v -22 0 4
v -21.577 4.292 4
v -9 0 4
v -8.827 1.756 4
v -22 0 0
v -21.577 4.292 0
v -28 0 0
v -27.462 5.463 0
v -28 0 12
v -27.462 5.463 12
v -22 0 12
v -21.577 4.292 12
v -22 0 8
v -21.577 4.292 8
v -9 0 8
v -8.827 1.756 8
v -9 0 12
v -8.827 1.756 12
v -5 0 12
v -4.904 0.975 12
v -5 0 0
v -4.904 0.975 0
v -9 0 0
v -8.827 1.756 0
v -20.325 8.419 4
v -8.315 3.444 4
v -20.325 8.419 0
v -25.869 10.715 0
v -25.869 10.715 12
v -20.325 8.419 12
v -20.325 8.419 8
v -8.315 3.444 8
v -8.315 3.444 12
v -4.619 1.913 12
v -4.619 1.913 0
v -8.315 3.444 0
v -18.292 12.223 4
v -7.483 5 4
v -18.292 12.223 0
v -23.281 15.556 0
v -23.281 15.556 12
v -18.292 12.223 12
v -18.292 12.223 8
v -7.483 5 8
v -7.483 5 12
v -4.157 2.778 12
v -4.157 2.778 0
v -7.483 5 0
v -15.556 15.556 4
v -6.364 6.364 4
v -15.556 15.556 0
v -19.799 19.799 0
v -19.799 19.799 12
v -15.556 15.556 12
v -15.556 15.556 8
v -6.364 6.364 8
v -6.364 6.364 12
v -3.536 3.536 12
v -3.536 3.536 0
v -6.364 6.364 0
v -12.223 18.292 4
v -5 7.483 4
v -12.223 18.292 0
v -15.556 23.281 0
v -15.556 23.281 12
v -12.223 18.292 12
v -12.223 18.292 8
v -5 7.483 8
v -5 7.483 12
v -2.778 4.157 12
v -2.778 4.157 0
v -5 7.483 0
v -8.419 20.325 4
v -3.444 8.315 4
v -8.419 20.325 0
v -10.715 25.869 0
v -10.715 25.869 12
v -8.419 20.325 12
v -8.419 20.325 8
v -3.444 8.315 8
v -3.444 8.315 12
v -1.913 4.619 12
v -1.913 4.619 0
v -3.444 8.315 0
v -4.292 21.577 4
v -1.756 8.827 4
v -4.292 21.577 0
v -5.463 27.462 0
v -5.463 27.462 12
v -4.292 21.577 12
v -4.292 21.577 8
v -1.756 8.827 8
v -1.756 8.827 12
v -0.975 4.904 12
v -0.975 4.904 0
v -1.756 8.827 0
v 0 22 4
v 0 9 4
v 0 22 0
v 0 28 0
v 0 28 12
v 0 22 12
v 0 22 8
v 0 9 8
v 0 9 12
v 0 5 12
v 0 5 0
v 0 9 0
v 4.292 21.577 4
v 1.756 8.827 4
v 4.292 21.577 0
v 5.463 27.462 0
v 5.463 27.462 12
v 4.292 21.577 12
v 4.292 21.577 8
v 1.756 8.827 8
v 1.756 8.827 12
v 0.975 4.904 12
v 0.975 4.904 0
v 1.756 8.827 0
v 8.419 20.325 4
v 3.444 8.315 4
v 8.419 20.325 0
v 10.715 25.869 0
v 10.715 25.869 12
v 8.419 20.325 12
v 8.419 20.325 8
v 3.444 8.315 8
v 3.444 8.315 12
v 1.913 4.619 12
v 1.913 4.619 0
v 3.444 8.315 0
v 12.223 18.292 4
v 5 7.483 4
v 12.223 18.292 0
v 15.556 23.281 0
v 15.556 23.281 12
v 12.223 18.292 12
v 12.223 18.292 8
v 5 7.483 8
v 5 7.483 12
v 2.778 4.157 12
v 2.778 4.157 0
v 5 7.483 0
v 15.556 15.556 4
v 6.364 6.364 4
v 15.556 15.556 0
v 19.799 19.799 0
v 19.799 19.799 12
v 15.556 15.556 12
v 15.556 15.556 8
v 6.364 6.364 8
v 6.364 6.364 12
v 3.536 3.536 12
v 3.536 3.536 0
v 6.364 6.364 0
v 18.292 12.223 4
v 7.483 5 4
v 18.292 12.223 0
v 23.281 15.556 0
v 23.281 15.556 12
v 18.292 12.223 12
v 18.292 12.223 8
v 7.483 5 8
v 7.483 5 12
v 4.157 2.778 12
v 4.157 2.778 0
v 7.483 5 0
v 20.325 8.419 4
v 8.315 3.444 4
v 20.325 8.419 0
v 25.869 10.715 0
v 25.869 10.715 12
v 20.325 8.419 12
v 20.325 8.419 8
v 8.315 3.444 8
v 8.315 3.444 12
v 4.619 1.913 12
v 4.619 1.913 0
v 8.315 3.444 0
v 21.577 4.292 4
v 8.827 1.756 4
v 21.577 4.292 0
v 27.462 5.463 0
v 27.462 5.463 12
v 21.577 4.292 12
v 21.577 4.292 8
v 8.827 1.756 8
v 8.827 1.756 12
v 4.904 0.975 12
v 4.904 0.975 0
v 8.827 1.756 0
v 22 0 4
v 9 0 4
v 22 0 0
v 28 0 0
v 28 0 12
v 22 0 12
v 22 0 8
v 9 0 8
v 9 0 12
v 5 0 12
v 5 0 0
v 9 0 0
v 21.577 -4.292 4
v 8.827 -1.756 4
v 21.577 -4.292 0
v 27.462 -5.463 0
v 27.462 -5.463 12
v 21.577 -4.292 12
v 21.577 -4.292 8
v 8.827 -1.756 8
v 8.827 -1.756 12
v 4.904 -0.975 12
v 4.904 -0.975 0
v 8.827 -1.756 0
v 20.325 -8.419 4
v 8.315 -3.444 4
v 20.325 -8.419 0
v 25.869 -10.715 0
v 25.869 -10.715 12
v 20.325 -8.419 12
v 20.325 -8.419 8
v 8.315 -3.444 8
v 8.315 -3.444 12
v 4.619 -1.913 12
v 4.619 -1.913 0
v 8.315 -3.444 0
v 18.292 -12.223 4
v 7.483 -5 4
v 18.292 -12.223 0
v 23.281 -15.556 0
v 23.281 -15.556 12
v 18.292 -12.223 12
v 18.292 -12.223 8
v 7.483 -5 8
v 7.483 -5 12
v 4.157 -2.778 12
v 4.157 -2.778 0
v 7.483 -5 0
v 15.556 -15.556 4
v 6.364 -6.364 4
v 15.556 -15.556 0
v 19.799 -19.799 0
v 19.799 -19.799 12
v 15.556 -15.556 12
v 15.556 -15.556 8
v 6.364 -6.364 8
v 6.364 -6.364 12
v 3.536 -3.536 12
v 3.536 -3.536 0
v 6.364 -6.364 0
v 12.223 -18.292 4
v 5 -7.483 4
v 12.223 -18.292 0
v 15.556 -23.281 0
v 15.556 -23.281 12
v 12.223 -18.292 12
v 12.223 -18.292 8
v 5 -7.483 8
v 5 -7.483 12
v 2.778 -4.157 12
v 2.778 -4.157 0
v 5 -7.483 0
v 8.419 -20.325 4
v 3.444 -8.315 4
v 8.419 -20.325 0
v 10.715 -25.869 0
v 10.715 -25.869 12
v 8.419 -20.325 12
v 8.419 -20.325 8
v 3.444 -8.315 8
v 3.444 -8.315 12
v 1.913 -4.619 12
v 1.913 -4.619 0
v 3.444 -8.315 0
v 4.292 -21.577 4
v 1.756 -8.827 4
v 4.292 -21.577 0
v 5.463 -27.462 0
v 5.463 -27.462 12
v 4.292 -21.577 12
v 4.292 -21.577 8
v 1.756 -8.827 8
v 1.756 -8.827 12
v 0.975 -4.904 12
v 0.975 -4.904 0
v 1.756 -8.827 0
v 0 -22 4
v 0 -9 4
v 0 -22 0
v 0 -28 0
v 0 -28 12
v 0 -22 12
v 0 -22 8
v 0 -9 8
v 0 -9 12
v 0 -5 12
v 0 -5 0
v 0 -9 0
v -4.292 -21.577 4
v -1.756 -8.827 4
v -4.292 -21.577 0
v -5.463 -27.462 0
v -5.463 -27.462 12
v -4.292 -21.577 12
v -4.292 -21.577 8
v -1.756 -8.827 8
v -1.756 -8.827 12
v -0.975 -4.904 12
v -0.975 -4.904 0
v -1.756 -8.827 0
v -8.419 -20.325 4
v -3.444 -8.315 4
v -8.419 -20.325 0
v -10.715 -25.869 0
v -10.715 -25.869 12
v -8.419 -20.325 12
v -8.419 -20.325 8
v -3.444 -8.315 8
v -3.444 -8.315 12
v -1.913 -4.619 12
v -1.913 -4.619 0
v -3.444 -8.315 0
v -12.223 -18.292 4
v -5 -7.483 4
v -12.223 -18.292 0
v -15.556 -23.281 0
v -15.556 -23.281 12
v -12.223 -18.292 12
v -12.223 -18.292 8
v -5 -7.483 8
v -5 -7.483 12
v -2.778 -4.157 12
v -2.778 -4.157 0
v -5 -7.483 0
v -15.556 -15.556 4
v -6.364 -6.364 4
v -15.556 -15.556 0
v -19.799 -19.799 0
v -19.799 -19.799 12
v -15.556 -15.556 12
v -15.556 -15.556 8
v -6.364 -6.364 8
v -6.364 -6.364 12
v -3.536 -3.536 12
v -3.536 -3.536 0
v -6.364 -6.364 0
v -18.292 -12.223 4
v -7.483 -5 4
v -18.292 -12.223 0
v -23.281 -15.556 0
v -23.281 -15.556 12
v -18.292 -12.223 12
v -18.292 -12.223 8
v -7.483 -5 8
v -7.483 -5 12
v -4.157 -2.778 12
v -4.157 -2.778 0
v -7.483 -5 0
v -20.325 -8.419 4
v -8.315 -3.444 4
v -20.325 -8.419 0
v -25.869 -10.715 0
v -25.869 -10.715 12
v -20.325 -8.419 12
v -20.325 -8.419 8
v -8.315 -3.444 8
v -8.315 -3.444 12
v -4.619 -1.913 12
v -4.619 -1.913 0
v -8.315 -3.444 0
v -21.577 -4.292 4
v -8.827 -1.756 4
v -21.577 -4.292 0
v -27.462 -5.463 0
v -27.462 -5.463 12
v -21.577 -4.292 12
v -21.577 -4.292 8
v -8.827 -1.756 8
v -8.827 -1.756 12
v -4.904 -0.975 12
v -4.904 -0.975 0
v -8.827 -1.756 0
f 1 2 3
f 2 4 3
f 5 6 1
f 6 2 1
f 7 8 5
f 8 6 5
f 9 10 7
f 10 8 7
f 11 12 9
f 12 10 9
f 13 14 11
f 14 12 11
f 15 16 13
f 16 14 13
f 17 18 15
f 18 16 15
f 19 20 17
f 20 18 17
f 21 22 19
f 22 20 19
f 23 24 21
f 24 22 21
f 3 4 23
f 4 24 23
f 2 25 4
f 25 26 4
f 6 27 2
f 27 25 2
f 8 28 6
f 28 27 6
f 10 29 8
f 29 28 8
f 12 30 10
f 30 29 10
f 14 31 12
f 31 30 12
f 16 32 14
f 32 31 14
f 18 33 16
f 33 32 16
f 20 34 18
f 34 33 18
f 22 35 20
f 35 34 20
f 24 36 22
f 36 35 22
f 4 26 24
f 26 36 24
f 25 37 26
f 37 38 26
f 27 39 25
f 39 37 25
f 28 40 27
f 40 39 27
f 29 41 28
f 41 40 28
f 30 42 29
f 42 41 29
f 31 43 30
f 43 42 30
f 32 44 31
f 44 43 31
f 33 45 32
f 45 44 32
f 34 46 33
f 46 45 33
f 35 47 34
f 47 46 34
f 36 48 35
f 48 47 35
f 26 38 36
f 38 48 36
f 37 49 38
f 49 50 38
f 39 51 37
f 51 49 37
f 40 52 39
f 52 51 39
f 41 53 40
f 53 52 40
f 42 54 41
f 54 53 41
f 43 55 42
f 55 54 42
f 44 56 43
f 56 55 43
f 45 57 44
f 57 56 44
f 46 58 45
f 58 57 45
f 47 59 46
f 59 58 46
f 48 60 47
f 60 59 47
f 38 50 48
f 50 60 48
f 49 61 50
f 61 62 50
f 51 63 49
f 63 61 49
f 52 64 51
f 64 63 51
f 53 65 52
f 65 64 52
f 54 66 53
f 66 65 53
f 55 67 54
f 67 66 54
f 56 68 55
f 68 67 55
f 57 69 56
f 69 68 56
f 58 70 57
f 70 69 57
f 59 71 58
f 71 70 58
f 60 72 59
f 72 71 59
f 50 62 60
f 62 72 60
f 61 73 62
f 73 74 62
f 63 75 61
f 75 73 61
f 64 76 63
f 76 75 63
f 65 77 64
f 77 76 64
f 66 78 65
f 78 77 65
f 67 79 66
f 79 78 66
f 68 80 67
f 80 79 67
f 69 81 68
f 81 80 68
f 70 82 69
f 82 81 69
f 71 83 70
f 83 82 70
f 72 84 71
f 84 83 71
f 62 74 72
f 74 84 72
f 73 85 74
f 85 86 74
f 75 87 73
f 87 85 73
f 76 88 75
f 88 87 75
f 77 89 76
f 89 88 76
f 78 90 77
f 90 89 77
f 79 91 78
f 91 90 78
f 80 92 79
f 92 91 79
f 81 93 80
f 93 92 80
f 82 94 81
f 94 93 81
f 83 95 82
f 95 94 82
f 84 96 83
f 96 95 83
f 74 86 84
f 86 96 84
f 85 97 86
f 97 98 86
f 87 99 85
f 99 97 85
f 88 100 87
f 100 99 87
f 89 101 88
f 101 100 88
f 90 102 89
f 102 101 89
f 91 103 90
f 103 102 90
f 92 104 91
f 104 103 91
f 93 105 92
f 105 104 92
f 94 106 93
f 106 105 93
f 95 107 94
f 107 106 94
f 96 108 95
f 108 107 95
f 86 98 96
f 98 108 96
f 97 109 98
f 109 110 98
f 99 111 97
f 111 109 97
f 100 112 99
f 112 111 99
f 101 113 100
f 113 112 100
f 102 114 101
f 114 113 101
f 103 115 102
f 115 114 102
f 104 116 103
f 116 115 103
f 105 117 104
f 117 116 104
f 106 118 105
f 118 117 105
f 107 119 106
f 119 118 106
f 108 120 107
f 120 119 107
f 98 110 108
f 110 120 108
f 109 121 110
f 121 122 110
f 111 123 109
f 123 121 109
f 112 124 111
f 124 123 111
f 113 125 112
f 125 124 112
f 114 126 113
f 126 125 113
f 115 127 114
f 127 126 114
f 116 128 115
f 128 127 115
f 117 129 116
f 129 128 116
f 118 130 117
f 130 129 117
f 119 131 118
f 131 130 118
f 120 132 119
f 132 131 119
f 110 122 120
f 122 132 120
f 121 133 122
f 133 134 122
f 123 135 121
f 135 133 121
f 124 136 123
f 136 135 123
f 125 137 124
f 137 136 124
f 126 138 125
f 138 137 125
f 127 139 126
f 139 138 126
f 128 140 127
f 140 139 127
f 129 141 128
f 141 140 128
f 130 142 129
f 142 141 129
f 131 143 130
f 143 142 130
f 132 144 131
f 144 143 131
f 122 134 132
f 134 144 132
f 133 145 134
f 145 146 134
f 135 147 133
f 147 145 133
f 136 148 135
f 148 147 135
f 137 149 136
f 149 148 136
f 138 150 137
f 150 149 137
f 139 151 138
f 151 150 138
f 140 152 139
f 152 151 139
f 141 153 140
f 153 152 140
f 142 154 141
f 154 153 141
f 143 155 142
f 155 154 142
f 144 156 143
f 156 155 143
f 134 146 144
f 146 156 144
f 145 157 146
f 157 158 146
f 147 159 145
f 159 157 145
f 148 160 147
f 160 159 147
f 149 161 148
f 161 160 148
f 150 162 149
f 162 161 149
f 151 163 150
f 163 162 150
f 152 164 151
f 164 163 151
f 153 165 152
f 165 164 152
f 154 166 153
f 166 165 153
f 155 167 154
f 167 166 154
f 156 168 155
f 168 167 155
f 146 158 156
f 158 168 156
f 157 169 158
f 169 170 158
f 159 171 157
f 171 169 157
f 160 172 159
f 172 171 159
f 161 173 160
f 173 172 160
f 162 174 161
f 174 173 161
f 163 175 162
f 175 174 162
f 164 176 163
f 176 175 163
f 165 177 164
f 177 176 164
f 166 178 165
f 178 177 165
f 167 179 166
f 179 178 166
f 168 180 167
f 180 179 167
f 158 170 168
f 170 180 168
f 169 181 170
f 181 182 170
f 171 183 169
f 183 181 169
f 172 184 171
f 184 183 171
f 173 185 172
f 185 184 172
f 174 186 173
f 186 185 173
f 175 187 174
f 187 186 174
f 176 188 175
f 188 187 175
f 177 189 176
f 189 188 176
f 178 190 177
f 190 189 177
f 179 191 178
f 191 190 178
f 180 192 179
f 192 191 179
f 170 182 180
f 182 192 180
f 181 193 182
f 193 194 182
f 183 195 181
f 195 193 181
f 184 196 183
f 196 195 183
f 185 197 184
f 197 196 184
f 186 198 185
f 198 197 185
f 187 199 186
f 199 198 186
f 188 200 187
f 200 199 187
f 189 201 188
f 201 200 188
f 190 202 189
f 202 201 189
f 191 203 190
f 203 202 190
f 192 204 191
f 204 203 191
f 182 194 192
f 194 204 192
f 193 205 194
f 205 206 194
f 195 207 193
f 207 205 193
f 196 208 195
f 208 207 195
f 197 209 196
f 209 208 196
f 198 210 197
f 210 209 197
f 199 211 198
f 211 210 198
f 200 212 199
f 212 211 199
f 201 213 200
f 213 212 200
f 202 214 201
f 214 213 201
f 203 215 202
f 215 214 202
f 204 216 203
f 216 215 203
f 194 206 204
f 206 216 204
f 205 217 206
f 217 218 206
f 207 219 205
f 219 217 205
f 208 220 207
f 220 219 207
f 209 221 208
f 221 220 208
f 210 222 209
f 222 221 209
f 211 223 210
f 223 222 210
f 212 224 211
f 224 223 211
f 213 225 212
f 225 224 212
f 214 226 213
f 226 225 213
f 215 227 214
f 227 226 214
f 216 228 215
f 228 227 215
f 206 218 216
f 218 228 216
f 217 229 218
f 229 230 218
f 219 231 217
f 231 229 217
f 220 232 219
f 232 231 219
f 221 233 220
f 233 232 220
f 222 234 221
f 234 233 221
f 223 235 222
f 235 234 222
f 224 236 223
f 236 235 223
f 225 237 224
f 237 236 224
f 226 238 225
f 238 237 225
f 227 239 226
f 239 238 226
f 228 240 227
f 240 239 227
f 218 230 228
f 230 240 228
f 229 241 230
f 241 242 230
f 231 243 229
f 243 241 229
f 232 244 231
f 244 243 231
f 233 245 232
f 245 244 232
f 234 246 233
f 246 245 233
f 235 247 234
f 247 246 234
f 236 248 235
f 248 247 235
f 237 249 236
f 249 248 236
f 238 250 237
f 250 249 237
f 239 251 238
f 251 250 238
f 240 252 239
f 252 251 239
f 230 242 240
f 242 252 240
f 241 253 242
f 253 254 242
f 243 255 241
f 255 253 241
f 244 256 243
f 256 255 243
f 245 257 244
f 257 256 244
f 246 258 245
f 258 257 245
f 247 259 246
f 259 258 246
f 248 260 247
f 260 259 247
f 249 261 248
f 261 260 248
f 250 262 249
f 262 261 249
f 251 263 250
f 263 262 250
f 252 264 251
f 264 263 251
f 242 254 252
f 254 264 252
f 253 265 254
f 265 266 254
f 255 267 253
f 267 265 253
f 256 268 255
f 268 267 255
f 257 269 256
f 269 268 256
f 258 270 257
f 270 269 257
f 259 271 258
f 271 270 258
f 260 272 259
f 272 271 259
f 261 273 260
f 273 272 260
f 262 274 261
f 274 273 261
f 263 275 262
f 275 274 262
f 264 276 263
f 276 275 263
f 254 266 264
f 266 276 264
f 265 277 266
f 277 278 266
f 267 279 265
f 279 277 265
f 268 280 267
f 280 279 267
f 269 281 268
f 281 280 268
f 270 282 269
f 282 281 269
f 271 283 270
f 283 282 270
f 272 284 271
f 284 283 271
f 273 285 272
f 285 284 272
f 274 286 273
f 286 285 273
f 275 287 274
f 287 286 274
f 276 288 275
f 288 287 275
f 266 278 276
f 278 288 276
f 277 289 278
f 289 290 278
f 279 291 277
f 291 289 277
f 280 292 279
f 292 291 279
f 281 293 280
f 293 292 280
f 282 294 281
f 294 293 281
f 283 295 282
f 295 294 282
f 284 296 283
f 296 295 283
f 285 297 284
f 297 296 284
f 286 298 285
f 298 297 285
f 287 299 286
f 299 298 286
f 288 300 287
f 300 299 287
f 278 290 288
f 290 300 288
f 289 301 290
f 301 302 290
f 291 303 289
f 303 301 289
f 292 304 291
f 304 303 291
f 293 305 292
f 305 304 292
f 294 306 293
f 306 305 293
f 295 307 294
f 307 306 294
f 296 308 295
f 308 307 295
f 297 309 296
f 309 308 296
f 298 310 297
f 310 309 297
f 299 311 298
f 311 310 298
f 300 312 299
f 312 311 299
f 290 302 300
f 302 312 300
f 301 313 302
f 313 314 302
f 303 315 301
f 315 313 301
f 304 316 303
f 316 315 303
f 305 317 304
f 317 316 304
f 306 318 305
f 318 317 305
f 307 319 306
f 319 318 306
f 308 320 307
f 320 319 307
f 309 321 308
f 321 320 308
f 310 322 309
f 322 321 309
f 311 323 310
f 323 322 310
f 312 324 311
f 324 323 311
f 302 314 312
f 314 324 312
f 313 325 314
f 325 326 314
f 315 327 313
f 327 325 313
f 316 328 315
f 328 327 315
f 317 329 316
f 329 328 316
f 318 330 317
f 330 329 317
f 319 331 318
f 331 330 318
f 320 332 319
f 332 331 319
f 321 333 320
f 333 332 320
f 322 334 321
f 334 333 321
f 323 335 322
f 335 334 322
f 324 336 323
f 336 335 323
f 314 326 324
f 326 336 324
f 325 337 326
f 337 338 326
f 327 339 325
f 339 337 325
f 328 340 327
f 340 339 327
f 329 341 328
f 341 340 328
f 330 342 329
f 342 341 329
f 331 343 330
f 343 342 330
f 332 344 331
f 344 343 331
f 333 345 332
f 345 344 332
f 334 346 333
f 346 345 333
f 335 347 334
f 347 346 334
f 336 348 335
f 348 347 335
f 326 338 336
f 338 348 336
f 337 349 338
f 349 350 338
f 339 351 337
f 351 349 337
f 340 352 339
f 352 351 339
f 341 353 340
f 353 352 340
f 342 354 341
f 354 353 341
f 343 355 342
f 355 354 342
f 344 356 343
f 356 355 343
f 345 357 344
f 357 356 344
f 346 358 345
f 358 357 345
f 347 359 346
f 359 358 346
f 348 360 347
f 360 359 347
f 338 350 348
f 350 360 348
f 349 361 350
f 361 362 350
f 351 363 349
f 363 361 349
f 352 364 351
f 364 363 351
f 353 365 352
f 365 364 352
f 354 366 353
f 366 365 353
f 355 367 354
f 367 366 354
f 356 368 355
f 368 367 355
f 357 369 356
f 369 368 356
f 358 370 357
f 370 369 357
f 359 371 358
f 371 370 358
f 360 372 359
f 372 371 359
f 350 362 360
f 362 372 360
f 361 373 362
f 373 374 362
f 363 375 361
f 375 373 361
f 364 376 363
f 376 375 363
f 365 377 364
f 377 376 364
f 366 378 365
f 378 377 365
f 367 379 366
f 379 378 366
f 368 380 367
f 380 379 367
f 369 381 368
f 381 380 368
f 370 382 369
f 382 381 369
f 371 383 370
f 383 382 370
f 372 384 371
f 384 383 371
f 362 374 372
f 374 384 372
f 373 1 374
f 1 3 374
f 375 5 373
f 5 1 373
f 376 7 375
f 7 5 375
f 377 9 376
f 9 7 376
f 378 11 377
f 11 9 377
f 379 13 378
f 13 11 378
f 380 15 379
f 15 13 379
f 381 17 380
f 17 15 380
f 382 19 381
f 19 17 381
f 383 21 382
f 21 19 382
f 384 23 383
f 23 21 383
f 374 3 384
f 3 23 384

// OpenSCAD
$fn = 32;

// ----------------------------------------------------------------------
// Revolved part: handwheel R28
// ----------------------------------------------------------------------

// --- parameters (mm) ---
bore_r = 5;               // bore radius
rim_r = 28;               // rim radius
rim_w = 6;                // rim axial width
rim_t = 12;               // rim diameter height
hub_r = 9;                // hub radius
web_t = 4;                // web thickness
revolve_angle = 360;      // revolve sweep, degrees

bore_d = 2 * bore_r;
rim_d = 2 * rim_r;
hub_d = 2 * hub_r;

profile = [[5, 0], [9, 0], [9, 4], [22, 4], [22, 0], [28, 0], [28, 12], [22, 12], [22, 8], [9, 8], [9, 12], [5, 12]];  // primary outline, 12 points, counter clockwise

// --- the one profile operation ---
rotate_extrude(angle = revolve_angle) polygon(points = profile);
